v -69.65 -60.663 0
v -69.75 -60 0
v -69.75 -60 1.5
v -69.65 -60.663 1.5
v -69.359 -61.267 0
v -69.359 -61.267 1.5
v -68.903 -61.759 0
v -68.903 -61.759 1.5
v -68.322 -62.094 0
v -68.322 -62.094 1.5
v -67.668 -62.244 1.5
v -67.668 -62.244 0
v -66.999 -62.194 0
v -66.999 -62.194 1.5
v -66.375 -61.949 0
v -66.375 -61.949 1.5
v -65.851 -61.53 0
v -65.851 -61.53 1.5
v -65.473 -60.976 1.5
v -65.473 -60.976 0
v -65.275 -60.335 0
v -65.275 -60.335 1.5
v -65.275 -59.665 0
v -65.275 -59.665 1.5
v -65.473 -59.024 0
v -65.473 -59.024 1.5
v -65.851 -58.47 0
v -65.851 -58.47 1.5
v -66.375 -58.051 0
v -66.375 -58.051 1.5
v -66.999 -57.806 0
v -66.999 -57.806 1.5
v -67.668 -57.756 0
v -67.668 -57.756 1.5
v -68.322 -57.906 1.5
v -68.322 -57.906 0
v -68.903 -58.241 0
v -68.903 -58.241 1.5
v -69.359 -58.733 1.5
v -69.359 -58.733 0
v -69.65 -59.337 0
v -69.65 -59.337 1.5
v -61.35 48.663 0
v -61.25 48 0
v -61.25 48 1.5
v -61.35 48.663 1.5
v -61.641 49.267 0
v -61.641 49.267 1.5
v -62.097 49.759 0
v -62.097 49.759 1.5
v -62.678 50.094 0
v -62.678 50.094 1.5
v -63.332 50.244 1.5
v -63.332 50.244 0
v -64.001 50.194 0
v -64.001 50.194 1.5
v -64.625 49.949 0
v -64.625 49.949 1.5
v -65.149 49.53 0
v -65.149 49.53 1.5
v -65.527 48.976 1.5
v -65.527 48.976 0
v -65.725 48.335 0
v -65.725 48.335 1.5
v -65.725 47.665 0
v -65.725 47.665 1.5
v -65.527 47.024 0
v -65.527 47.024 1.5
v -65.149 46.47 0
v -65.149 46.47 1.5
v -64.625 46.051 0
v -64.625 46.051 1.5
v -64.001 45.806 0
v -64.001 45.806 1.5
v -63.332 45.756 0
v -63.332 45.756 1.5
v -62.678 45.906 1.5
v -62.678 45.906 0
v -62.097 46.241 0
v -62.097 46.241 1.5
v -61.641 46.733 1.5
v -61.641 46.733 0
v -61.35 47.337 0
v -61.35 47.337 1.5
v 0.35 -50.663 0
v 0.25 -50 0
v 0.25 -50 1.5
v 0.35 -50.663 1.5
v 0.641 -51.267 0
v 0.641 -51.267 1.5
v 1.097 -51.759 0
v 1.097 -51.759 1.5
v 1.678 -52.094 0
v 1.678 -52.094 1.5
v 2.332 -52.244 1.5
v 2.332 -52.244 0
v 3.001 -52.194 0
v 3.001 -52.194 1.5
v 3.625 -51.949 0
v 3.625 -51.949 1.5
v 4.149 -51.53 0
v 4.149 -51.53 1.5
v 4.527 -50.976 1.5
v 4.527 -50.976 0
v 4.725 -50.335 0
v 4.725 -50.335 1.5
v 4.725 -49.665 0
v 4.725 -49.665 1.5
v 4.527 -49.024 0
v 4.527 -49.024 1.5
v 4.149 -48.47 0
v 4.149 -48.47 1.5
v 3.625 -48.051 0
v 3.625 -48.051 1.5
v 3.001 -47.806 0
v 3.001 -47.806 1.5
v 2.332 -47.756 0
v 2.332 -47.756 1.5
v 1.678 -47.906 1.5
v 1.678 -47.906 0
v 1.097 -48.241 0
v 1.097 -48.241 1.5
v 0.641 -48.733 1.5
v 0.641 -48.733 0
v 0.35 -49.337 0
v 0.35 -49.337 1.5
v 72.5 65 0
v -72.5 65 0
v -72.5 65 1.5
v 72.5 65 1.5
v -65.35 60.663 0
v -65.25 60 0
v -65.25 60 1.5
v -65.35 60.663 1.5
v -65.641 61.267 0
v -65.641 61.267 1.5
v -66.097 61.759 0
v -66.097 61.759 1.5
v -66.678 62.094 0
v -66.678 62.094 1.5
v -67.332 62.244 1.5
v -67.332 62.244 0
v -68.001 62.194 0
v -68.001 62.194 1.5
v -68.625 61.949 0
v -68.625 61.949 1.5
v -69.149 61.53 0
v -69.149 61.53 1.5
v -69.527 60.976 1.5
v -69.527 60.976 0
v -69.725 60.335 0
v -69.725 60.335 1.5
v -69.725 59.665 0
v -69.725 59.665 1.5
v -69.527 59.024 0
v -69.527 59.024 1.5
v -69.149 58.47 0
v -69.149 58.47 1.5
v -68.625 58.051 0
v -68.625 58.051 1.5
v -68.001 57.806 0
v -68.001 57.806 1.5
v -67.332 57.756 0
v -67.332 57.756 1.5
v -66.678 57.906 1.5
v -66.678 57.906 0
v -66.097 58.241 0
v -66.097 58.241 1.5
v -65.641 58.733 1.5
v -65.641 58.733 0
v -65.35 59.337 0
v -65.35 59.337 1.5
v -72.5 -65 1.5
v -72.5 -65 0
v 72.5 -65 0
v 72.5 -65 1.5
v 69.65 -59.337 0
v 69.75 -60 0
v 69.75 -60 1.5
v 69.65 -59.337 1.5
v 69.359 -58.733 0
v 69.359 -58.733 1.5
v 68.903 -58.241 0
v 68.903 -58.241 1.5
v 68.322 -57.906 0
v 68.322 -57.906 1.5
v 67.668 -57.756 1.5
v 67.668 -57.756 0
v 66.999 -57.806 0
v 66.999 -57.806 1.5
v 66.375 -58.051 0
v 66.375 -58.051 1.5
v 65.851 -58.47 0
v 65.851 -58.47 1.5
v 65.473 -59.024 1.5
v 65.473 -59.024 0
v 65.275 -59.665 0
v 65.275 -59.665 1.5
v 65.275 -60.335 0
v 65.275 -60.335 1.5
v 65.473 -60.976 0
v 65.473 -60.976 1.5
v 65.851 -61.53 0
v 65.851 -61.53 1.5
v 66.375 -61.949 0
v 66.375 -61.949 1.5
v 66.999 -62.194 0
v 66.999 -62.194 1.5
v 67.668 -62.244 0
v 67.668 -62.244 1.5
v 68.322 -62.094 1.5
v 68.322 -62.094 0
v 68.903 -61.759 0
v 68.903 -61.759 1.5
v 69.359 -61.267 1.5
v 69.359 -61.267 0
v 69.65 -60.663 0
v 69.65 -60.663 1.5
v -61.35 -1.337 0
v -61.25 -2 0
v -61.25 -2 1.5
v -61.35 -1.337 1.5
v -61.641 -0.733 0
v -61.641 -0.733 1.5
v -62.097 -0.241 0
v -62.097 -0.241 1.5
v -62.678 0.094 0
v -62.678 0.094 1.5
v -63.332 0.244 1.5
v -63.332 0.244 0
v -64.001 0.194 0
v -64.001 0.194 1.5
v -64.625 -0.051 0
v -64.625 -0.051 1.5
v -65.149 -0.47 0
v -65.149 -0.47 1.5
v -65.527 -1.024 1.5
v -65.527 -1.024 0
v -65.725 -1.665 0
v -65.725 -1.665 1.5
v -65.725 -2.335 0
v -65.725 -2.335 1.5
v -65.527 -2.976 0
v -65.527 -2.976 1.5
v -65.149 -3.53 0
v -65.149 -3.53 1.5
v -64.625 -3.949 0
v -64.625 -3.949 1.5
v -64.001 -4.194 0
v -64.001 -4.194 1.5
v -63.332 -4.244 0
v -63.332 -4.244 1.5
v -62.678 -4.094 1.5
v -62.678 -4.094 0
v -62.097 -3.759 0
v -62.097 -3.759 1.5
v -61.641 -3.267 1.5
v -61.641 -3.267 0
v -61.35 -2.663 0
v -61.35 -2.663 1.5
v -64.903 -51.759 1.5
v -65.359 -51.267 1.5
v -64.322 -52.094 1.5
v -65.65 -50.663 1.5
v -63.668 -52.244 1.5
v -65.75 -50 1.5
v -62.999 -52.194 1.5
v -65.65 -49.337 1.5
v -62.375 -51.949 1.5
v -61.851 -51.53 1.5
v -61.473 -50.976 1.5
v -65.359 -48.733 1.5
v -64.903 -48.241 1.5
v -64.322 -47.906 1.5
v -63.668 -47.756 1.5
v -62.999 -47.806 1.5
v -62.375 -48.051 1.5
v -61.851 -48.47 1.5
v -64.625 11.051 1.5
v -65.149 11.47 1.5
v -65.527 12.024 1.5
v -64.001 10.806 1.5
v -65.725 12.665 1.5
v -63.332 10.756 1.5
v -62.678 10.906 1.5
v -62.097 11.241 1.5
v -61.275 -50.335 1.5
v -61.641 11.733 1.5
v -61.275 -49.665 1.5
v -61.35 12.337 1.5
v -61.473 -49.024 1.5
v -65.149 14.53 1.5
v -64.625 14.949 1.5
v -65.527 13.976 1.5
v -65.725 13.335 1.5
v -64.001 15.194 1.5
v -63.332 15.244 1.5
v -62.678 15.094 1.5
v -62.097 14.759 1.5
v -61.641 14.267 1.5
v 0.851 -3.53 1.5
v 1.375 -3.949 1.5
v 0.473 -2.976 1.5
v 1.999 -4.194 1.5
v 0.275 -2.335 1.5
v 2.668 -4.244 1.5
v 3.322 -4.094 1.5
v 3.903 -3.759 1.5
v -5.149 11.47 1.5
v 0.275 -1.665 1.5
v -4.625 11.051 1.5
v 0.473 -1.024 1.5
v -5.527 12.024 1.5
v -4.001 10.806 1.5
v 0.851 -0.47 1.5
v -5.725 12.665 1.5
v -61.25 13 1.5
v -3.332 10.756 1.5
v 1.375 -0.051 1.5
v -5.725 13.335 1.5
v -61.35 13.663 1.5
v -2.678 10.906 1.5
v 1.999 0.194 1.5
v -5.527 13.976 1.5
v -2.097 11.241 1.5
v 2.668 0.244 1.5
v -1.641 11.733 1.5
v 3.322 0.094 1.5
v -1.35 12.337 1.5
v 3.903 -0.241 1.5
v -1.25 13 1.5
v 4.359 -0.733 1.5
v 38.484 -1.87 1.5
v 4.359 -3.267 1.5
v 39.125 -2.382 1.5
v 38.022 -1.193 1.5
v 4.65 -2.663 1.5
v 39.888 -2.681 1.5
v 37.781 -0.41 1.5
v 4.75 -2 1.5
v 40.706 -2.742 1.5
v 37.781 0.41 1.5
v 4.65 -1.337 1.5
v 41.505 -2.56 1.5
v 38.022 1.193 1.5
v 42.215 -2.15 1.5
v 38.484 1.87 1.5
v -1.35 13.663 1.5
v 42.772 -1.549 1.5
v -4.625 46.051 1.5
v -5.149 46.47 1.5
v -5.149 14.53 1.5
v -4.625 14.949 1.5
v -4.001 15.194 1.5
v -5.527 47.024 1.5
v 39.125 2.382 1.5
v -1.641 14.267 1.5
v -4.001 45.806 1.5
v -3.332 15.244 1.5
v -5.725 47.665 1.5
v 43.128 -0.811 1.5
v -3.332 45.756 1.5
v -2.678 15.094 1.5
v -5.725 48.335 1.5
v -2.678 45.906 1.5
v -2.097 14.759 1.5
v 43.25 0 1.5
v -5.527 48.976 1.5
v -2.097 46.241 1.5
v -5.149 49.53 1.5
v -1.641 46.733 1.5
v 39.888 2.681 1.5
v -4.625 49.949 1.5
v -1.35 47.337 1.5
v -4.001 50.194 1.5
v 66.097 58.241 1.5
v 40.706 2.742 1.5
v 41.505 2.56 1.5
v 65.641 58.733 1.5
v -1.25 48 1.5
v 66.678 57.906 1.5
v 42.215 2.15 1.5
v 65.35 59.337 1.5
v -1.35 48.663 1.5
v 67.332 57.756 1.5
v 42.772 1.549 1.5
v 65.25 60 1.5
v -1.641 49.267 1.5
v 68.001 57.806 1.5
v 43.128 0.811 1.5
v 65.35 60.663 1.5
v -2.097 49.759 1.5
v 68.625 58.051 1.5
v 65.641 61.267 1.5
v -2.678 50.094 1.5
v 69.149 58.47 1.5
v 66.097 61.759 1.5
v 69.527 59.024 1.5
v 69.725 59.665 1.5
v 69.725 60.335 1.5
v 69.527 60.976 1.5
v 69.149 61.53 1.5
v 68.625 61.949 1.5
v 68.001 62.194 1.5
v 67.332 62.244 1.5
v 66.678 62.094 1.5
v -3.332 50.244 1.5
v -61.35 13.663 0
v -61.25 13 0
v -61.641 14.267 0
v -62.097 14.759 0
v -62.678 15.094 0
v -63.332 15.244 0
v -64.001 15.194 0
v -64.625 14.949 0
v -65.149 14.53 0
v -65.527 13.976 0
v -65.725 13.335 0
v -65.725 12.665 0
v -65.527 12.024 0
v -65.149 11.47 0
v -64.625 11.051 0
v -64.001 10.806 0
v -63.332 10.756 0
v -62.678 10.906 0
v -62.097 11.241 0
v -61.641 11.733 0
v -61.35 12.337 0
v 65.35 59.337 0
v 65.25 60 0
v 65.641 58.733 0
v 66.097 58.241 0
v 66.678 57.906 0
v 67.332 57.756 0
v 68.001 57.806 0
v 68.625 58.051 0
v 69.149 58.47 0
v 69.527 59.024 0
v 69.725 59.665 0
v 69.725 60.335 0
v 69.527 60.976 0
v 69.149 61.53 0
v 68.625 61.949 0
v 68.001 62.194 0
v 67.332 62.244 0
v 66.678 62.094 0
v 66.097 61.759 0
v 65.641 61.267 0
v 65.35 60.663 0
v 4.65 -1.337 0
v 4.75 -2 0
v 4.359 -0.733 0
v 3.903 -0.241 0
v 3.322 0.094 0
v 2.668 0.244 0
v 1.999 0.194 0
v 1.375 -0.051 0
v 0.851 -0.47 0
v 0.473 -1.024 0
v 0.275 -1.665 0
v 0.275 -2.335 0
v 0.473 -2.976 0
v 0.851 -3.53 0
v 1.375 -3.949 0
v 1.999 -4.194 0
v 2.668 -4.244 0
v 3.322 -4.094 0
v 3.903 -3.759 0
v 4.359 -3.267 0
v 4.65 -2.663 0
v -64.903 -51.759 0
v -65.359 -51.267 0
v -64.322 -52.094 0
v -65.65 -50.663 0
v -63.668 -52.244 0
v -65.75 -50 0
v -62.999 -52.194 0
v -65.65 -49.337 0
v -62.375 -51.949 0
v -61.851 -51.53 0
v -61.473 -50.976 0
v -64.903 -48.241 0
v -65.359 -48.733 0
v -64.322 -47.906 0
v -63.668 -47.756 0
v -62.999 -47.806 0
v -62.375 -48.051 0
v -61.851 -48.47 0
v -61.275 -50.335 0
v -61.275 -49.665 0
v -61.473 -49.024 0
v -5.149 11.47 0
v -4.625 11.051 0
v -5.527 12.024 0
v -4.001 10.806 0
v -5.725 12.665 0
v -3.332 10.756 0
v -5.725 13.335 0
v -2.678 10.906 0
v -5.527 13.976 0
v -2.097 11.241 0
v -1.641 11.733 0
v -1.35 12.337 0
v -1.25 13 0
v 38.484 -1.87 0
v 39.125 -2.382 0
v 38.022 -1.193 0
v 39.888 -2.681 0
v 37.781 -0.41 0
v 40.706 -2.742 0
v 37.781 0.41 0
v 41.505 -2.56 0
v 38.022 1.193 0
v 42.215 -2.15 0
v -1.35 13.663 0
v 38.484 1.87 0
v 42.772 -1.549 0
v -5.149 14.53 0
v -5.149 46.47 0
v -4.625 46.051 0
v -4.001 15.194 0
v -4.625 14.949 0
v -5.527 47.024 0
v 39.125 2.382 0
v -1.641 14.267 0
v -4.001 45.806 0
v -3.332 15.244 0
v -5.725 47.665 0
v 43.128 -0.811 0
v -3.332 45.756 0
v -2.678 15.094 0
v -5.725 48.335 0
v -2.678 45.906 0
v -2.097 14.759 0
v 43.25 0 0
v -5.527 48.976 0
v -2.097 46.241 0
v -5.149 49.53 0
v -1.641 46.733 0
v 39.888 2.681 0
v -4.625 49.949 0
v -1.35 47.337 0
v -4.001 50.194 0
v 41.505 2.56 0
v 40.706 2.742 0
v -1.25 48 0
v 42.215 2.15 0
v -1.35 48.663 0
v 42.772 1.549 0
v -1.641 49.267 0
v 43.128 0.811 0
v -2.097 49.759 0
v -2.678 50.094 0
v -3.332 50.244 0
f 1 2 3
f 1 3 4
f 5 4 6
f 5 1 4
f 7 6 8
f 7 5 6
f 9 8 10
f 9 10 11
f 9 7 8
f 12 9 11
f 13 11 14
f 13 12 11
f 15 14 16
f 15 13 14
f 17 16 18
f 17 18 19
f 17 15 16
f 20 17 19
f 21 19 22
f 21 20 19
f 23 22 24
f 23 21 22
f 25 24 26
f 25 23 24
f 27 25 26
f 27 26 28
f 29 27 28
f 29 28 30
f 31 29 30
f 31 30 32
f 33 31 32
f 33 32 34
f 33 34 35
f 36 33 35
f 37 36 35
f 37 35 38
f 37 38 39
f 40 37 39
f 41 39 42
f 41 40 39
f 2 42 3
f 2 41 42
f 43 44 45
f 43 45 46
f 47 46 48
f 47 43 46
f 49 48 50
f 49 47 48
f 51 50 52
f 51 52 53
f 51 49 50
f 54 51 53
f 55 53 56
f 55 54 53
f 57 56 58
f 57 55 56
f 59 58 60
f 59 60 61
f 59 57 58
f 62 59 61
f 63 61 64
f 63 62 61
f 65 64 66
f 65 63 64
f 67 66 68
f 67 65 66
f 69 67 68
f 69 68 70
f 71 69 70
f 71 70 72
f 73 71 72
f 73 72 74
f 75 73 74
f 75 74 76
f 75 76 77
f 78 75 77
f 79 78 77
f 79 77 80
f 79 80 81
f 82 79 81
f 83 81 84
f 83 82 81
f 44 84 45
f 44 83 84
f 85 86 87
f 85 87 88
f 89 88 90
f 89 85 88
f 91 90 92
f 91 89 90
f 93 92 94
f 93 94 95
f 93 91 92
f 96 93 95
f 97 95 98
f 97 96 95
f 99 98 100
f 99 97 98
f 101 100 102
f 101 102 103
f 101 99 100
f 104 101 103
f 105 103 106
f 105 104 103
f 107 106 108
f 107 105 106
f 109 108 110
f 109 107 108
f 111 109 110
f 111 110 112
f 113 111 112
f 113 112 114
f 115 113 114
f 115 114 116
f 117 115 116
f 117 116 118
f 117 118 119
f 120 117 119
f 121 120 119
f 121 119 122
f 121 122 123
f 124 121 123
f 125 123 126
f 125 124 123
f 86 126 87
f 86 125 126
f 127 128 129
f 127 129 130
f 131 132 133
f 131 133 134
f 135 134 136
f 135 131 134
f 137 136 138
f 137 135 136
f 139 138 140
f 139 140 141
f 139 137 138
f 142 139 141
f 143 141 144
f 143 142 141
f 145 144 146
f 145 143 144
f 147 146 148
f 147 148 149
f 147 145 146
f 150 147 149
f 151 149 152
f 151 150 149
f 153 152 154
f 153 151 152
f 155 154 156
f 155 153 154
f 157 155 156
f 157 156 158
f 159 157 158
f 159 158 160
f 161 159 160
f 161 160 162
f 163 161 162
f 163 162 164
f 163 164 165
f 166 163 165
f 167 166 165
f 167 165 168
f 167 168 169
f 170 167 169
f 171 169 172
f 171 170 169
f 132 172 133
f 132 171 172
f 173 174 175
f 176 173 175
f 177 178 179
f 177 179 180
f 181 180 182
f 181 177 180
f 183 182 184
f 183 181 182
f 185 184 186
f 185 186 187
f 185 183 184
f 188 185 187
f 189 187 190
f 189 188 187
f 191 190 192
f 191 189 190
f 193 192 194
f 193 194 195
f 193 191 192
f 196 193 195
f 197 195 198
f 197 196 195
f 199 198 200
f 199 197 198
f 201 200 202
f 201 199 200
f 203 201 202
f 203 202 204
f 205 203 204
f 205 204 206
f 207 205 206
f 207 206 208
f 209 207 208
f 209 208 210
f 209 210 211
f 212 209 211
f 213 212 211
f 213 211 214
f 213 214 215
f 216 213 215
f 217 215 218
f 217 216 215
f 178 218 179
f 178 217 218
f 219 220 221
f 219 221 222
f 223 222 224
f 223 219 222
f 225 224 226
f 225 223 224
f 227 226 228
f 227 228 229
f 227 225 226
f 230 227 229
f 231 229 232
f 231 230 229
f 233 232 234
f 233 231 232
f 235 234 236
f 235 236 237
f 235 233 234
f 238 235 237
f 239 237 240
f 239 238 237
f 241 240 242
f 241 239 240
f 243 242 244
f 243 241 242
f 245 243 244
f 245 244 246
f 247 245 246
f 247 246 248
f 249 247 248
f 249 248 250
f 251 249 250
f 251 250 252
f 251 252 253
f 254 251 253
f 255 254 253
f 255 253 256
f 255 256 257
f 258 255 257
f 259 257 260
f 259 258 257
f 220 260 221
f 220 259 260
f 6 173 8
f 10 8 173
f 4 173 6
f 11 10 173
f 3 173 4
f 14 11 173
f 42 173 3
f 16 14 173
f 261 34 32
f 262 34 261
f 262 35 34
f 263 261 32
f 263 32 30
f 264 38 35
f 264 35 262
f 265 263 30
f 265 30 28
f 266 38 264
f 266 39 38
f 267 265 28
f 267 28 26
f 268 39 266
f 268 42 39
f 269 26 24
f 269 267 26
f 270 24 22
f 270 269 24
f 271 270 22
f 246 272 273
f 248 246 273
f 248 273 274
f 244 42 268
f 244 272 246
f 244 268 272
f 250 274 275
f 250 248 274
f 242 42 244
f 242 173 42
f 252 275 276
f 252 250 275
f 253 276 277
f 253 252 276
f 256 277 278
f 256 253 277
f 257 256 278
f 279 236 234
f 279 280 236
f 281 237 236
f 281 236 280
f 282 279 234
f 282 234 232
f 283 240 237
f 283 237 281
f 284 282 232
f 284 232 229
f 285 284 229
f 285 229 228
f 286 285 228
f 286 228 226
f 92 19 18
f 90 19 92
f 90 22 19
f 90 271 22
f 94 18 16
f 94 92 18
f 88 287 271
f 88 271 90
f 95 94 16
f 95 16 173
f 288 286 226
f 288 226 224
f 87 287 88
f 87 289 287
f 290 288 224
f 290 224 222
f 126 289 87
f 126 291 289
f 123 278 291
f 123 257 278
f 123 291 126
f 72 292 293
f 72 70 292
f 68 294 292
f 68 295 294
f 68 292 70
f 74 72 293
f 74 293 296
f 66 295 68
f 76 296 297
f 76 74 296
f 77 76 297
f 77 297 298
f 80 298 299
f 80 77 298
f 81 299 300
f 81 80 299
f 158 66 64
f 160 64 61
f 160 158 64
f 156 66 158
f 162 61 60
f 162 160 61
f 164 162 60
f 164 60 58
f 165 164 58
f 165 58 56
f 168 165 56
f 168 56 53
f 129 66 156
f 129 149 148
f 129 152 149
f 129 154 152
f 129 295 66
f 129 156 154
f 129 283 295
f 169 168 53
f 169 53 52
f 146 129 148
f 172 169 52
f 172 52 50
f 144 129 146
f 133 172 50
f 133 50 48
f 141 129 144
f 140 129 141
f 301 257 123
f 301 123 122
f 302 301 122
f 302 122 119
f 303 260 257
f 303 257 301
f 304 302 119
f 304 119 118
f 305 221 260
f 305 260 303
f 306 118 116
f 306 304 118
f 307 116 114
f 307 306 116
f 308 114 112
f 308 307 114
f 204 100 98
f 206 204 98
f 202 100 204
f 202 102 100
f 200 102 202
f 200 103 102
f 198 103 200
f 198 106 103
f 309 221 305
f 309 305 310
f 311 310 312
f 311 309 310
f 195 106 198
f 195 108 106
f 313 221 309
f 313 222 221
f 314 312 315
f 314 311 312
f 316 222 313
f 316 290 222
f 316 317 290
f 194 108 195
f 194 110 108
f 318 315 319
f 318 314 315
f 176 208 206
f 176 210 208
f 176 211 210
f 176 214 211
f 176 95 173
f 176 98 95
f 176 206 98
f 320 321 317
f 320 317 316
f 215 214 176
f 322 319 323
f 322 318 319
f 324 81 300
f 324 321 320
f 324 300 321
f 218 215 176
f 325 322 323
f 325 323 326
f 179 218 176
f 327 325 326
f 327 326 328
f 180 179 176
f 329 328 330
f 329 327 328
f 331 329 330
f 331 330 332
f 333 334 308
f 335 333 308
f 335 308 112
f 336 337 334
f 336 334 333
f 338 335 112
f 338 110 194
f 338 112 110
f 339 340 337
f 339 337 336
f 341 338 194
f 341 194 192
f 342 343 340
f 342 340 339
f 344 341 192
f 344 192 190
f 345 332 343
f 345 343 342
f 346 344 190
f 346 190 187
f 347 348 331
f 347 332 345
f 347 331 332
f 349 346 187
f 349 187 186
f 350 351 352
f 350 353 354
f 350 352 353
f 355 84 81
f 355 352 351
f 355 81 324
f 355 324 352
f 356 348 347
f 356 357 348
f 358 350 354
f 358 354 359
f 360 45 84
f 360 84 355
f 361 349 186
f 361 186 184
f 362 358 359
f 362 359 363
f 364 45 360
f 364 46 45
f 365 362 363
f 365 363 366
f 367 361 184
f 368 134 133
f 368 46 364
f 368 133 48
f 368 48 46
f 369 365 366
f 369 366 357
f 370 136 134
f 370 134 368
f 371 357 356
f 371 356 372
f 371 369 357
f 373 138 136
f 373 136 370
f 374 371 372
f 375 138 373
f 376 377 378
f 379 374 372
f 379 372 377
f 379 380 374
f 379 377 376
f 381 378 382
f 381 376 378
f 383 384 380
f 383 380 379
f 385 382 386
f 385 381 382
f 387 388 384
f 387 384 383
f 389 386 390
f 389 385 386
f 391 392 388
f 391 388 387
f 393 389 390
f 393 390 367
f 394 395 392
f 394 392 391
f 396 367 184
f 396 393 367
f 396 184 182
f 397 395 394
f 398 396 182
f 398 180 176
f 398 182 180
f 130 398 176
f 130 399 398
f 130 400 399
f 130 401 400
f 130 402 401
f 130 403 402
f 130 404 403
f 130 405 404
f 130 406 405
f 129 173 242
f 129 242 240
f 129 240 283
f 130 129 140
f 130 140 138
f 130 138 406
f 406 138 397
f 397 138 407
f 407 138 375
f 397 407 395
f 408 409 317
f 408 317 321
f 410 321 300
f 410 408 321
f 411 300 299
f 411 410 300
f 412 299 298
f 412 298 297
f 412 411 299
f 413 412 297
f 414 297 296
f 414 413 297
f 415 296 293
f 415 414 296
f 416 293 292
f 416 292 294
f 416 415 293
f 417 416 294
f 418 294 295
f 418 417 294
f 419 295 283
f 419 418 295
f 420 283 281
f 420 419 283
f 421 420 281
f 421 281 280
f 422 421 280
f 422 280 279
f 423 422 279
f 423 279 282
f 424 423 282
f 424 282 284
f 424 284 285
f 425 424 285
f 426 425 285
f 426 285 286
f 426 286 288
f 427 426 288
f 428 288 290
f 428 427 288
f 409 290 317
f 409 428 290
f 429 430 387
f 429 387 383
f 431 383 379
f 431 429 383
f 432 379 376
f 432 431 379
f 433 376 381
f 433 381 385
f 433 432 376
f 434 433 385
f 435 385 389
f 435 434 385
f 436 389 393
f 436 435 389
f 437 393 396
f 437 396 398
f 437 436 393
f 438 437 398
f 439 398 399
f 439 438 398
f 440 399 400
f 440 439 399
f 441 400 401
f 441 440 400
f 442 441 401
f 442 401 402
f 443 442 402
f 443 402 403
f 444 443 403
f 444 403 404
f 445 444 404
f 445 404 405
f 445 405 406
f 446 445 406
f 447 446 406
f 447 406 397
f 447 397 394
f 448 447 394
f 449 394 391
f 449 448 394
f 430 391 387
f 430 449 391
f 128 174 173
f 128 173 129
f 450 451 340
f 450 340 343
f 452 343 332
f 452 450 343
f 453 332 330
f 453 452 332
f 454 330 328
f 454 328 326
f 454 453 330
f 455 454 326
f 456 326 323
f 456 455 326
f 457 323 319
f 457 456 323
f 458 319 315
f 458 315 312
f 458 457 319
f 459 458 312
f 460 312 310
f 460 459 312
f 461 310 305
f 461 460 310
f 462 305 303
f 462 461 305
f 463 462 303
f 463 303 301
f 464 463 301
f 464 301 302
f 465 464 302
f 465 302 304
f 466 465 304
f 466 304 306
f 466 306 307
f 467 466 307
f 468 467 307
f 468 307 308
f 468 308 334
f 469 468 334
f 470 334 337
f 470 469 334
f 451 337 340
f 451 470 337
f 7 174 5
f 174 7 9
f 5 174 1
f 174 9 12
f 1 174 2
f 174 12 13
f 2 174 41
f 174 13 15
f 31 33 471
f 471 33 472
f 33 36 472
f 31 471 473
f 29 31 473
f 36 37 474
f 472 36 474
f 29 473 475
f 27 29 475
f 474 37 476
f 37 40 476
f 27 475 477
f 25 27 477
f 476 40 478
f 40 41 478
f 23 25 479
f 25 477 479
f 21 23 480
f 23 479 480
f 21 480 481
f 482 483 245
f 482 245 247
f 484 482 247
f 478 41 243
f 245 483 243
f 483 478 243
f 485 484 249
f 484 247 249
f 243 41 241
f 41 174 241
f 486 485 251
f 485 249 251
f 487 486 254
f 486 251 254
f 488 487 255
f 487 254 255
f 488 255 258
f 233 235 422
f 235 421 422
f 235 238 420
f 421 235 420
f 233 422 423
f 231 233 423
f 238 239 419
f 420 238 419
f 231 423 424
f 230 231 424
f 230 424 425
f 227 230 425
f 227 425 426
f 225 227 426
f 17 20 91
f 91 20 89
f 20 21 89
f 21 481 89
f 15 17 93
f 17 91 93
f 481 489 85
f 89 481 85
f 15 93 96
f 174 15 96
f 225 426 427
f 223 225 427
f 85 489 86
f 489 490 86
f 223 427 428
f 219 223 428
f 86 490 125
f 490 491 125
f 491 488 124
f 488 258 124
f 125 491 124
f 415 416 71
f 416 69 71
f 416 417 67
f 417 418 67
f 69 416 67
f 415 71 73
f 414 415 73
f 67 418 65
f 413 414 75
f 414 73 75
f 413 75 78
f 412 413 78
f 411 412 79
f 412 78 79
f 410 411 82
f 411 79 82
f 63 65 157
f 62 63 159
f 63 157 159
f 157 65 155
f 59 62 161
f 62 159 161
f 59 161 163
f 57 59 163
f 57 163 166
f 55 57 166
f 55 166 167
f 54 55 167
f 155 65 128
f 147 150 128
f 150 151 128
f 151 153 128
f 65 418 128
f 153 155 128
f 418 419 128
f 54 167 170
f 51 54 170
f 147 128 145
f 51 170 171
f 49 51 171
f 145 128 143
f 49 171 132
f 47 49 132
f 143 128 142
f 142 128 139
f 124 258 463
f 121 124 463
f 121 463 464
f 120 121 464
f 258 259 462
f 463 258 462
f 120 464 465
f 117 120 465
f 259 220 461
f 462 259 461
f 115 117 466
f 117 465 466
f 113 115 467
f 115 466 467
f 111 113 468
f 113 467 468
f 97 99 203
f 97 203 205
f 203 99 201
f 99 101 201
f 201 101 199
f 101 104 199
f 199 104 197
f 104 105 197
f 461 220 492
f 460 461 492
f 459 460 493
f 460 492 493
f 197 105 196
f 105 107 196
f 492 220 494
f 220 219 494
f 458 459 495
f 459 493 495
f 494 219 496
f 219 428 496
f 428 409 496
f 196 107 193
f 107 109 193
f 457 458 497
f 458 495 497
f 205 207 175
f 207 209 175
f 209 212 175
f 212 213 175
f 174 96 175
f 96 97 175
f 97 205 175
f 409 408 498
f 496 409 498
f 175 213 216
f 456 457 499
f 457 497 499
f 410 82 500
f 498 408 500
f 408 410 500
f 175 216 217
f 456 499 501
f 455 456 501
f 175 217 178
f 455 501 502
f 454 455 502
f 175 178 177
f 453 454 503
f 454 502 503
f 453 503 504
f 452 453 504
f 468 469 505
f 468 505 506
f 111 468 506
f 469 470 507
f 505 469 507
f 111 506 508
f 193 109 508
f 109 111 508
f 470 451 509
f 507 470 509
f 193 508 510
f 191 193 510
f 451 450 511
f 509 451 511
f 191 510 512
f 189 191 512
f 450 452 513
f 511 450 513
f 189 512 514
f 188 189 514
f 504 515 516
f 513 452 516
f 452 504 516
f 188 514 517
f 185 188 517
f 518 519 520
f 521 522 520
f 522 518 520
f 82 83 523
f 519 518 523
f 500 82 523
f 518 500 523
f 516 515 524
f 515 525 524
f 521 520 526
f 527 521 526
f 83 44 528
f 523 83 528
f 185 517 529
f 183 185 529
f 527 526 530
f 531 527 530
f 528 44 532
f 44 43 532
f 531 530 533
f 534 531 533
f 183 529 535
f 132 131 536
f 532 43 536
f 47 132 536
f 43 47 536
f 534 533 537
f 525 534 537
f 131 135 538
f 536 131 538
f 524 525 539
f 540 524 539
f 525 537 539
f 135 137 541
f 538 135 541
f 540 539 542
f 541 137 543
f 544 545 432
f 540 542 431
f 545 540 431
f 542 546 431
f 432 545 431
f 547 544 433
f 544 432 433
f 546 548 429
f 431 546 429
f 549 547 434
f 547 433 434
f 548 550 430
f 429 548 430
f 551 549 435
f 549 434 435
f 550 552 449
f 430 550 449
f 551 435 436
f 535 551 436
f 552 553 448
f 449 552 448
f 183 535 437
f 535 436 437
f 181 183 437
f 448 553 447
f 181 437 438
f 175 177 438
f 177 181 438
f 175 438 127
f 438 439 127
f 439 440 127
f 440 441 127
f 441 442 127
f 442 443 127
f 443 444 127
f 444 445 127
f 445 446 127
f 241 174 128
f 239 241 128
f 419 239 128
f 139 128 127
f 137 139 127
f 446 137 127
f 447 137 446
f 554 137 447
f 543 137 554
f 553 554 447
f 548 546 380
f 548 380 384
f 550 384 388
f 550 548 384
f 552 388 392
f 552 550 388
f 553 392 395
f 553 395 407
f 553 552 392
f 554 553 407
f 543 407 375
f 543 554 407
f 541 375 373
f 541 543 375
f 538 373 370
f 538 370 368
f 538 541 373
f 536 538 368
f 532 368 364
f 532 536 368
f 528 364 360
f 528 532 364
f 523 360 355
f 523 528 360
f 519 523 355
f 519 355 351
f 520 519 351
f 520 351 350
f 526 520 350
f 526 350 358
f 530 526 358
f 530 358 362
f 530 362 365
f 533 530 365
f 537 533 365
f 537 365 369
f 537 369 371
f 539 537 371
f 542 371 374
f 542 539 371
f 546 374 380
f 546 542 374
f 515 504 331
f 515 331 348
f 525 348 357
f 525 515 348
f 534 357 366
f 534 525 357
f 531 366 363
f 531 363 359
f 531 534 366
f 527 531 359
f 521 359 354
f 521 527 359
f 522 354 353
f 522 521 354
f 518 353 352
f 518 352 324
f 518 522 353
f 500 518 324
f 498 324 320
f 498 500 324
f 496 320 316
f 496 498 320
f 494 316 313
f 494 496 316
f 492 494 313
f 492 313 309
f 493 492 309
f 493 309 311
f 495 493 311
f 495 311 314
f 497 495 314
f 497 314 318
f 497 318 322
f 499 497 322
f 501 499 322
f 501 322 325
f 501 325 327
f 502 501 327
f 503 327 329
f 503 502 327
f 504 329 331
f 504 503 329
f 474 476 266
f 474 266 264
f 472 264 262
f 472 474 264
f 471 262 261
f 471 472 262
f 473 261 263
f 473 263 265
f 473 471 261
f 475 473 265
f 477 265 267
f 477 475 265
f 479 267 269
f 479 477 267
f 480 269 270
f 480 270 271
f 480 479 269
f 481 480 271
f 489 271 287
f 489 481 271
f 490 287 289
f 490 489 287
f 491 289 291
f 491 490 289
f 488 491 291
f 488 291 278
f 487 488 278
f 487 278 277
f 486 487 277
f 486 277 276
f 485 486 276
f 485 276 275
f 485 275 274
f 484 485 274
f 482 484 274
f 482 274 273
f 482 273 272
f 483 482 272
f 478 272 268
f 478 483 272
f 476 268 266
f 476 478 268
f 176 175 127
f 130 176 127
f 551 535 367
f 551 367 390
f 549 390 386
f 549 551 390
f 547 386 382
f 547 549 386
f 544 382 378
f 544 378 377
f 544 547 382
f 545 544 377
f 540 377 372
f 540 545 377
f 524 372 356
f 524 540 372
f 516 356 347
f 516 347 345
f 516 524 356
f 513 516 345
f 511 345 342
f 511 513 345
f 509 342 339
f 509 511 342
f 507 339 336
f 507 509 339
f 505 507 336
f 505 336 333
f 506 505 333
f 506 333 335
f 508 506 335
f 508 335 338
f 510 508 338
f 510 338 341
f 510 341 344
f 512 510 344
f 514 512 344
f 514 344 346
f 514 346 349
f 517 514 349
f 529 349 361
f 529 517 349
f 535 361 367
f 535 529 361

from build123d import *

# Parameters (mm, degrees)
SKETCH_1_W      = 145
SKETCH_1_H      = 130
SKETCH_1_R      = 2.25
SKETCH_1_R_2    = 2.75
EXTRUDE_1_DEPTH = 1.5


with BuildPart() as part:
    # Эскиз1 → Вытянуть1 (new body)
    with BuildSketch(Plane.XY):
        Rectangle(SKETCH_1_W, SKETCH_1_H)
        with Locations((-67.5, 60)):
            Circle(SKETCH_1_R, mode=Mode.SUBTRACT)
        with Locations(Location((-67.5, -60, 0), (0, 0, 180))):
            Circle(SKETCH_1_R, mode=Mode.SUBTRACT)
        with Locations((67.5, -60)):
            Circle(SKETCH_1_R, mode=Mode.SUBTRACT)
        with Locations(Location((67.5, 60, 0), (0, 0, 180))):
            Circle(SKETCH_1_R, mode=Mode.SUBTRACT)
        with Locations((-63.5, -2)):
            Circle(SKETCH_1_R, mode=Mode.SUBTRACT)
        with Locations(Location((-63.5, -50, 0), (0, 0, 180))):
            Circle(SKETCH_1_R, mode=Mode.SUBTRACT)
        with Locations((2.5, -2)):
            Circle(SKETCH_1_R, mode=Mode.SUBTRACT)
        with Locations(Location((2.5, -50, 0), (0, 0, 180))):
            Circle(SKETCH_1_R, mode=Mode.SUBTRACT)
        with Locations((40.5, 0)):
            Circle(SKETCH_1_R_2, mode=Mode.SUBTRACT)
        with Locations((-63.5, 13)):
            Circle(SKETCH_1_R, mode=Mode.SUBTRACT)
        with Locations((-63.5, 48)):
            Circle(SKETCH_1_R, mode=Mode.SUBTRACT)
        with Locations((-3.5, 13)):
            Circle(SKETCH_1_R, mode=Mode.SUBTRACT)
        with Locations((-3.5, 48)):
            Circle(SKETCH_1_R, mode=Mode.SUBTRACT)
    extrude(amount=EXTRUDE_1_DEPTH)


solid = part.part
